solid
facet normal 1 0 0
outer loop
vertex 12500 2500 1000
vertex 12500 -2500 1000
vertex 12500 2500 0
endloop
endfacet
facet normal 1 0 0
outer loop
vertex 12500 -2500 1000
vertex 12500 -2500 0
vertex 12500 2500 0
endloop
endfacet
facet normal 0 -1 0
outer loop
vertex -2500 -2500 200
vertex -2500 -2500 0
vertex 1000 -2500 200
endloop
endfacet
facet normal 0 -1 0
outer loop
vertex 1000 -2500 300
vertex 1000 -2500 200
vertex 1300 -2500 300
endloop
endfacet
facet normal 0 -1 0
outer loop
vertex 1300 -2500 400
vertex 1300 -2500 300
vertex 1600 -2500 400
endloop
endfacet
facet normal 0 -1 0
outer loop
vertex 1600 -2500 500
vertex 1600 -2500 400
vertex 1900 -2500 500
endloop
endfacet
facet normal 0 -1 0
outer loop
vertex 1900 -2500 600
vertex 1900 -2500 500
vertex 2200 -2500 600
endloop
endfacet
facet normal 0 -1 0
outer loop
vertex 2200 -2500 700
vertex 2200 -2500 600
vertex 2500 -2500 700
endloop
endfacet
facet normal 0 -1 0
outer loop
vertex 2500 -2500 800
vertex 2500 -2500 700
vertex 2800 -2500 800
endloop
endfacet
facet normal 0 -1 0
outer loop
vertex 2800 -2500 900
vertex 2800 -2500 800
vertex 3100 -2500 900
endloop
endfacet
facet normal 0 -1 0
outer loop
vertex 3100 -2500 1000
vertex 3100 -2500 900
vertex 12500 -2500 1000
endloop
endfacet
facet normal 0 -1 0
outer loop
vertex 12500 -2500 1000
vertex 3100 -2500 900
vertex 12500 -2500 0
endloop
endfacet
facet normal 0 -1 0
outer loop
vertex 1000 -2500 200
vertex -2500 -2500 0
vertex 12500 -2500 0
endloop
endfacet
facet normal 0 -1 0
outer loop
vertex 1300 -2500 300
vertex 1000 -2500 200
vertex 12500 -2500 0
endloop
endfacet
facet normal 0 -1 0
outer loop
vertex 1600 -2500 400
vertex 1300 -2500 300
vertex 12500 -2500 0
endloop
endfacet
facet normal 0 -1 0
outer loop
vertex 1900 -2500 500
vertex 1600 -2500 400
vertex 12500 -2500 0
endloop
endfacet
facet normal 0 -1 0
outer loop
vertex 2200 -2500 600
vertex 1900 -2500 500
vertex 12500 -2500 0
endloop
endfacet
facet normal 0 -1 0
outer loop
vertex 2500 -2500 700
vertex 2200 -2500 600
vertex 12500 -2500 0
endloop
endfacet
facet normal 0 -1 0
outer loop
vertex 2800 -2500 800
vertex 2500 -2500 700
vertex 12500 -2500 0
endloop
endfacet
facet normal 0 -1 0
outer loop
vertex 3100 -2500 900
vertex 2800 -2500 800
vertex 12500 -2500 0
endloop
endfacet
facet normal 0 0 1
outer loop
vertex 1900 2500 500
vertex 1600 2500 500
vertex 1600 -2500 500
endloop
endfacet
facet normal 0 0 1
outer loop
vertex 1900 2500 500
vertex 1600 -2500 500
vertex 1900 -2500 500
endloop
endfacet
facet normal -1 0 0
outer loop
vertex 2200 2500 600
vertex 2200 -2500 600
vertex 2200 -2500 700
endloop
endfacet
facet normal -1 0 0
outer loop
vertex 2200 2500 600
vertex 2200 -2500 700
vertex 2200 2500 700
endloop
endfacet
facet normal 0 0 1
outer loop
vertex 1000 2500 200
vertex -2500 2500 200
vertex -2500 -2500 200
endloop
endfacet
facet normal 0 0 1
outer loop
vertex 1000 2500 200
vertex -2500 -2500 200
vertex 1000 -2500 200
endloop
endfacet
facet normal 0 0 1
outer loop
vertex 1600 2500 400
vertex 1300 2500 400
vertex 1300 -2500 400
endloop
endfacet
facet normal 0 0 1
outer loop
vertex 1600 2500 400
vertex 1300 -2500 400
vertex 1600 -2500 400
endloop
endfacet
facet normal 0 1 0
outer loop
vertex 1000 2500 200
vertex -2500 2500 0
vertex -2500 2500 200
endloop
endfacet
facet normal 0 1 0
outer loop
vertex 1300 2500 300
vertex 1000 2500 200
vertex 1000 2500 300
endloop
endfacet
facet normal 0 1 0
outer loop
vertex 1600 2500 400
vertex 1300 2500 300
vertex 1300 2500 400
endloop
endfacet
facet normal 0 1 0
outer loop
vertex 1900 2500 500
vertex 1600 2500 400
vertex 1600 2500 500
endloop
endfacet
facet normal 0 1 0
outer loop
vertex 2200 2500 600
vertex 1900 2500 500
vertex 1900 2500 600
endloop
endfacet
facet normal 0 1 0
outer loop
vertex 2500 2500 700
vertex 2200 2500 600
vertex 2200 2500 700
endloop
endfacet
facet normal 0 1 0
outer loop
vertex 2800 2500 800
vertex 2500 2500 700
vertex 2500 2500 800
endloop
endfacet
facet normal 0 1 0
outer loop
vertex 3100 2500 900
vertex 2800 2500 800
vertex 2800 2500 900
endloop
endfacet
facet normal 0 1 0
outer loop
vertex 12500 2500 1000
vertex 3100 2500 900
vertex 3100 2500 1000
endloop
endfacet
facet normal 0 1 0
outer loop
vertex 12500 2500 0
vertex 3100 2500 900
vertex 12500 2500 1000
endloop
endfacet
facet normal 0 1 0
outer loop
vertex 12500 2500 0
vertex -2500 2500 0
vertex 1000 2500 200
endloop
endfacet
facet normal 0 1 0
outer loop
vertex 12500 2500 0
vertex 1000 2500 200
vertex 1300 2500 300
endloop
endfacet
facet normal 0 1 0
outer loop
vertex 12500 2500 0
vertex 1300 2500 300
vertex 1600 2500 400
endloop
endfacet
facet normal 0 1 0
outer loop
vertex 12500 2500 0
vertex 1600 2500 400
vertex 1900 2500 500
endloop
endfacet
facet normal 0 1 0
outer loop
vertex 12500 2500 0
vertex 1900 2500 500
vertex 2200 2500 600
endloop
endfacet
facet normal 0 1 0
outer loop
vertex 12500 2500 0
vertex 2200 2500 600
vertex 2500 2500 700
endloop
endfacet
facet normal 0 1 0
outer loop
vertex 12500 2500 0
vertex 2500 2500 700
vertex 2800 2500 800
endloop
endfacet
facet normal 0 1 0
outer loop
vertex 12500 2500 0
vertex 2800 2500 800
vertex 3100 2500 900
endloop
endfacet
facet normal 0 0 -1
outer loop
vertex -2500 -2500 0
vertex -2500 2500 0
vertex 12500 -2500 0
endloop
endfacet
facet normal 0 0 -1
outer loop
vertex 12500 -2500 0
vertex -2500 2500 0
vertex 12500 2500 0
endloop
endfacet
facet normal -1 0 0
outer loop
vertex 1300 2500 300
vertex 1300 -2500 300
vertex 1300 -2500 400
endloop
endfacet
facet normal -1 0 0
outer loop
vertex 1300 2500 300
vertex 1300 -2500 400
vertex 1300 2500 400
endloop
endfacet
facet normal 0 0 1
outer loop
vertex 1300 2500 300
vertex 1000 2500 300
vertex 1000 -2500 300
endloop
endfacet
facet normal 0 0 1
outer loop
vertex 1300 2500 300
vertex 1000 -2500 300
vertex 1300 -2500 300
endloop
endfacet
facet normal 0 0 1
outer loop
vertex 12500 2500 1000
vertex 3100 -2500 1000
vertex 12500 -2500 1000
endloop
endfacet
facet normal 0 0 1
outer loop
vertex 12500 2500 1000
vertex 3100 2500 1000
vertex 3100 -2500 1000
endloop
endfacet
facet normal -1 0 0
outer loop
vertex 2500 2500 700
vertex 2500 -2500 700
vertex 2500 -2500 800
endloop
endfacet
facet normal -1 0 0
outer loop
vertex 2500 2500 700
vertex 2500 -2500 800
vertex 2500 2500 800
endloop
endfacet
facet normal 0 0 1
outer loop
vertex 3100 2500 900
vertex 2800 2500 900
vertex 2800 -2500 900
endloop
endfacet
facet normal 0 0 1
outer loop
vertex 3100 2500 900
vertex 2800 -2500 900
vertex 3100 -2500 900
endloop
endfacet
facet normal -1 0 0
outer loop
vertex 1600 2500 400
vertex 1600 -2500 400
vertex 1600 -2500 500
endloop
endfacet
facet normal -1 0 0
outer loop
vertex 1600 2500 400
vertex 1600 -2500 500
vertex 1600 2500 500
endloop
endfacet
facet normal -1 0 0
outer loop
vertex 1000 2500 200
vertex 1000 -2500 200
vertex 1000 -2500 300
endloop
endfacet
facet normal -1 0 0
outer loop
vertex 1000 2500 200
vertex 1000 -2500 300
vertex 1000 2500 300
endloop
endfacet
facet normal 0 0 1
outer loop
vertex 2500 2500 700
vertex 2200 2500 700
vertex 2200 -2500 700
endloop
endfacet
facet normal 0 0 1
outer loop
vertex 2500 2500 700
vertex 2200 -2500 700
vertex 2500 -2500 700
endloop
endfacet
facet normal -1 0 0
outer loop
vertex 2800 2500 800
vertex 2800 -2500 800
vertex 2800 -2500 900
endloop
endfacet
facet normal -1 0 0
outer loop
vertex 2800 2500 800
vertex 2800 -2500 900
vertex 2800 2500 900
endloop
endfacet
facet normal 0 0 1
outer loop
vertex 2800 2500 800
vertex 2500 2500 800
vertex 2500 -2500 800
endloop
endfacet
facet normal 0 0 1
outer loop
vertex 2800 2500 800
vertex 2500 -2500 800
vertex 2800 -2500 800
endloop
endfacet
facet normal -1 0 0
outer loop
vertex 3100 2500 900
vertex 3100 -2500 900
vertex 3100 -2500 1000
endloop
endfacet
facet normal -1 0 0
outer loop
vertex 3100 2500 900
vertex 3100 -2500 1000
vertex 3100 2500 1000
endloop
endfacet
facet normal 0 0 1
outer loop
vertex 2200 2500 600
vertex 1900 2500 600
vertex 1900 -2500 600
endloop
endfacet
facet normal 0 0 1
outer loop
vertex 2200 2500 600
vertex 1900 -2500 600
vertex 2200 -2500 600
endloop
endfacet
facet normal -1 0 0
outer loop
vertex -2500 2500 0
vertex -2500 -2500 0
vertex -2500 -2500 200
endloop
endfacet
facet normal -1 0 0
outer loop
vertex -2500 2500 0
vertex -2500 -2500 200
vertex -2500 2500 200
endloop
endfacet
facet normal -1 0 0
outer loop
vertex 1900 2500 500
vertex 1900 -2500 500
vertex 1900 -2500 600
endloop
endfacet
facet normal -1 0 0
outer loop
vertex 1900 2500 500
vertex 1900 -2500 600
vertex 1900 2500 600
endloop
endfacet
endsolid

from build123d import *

# Parameters (mm, degrees)
SKETCH3_W           = 15000
SKETCH3_H           = 5000
BOSS_EXTRUDE1_DEPTH = 200
SKETCH4_W           = 300
SKETCH4_H           = 5000
STEP1_DEPTH         = 100
SKETCH4_4_W         = 300
SKETCH4_4_H         = 5000
STEP2_DEPTH         = 200
SKETCH4_5_W         = 300
SKETCH4_5_H         = 5000
STEP3_DEPTH         = 300
SKETCH4_6_W         = 300
SKETCH4_6_H         = 5000
STEP4_DEPTH         = 400
SKETCH4_7_W         = 300
SKETCH4_7_H         = 5000
STEP5_DEPTH         = 500
SKETCH4_8_W         = 300
SKETCH4_8_H         = 5000
STEP6_DEPTH         = 600
SKETCH4_9_W         = 300
SKETCH4_9_H         = 5000
STEP7_DEPTH         = 700
SKETCH4_10_W        = 300
SKETCH4_10_H        = 5000
STEP8_DEPTH         = 800
SKETCH8_W           = 9100
SKETCH8_H           = 5000
STEP9_DEPTH         = 800


with BuildPart() as part:
    # Sketch3 → Boss-Extrude1 (new body)
    with BuildSketch(Plane.XY):
        with Locations((5000, 0)):
            Rectangle(SKETCH3_W, SKETCH3_H)
    extrude(amount=BOSS_EXTRUDE1_DEPTH)

    # Sketch4 → Step1 (add)
    with BuildSketch(Plane.XY.offset(200)):
        with Locations((1150, 0)):
            Rectangle(SKETCH4_W, SKETCH4_H)
    extrude(amount=STEP1_DEPTH)

    # Sketch4<4> → Step2 (add)
    with BuildSketch(Plane.XY.offset(200)):
        with Locations((1450, 0)):
            Rectangle(SKETCH4_4_W, SKETCH4_4_H)
    extrude(amount=STEP2_DEPTH)

    # Sketch4<5> → Step3 (add)
    with BuildSketch(Plane.XY.offset(200)):
        with Locations((1750, 0)):
            Rectangle(SKETCH4_5_W, SKETCH4_5_H)
    extrude(amount=STEP3_DEPTH)

    # Sketch4<6> → Step4 (add)
    with BuildSketch(Plane.XY.offset(200)):
        with Locations((2050, 0)):
            Rectangle(SKETCH4_6_W, SKETCH4_6_H)
    extrude(amount=STEP4_DEPTH)

    # Sketch4<7> → Step5 (add)
    with BuildSketch(Plane.XY.offset(200)):
        with Locations((2350, 0)):
            Rectangle(SKETCH4_7_W, SKETCH4_7_H)
    extrude(amount=STEP5_DEPTH)

    # Sketch4<8> → Step6 (add)
    with BuildSketch(Plane.XY.offset(200)):
        with Locations((2650, 0)):
            Rectangle(SKETCH4_8_W, SKETCH4_8_H)
    extrude(amount=STEP6_DEPTH)

    # Sketch4<9> → Step7 (add)
    with BuildSketch(Plane.XY.offset(200)):
        with Locations((2950, 0)):
            Rectangle(SKETCH4_9_W, SKETCH4_9_H)
    extrude(amount=STEP7_DEPTH)

    # Sketch4<10> → Step8 (add)
    with BuildSketch(Plane.XY.offset(200)):
        with Locations((3250, 0)):
            Rectangle(SKETCH4_10_W, SKETCH4_10_H)
    extrude(amount=STEP8_DEPTH)

    # Sketch8 → Step9 (add)
    with BuildSketch(Plane.XY.offset(200)):
        with Locations((7950, 0)):
            Rectangle(SKETCH8_W, SKETCH8_H)
    extrude(amount=STEP9_DEPTH)


solid = part.part
